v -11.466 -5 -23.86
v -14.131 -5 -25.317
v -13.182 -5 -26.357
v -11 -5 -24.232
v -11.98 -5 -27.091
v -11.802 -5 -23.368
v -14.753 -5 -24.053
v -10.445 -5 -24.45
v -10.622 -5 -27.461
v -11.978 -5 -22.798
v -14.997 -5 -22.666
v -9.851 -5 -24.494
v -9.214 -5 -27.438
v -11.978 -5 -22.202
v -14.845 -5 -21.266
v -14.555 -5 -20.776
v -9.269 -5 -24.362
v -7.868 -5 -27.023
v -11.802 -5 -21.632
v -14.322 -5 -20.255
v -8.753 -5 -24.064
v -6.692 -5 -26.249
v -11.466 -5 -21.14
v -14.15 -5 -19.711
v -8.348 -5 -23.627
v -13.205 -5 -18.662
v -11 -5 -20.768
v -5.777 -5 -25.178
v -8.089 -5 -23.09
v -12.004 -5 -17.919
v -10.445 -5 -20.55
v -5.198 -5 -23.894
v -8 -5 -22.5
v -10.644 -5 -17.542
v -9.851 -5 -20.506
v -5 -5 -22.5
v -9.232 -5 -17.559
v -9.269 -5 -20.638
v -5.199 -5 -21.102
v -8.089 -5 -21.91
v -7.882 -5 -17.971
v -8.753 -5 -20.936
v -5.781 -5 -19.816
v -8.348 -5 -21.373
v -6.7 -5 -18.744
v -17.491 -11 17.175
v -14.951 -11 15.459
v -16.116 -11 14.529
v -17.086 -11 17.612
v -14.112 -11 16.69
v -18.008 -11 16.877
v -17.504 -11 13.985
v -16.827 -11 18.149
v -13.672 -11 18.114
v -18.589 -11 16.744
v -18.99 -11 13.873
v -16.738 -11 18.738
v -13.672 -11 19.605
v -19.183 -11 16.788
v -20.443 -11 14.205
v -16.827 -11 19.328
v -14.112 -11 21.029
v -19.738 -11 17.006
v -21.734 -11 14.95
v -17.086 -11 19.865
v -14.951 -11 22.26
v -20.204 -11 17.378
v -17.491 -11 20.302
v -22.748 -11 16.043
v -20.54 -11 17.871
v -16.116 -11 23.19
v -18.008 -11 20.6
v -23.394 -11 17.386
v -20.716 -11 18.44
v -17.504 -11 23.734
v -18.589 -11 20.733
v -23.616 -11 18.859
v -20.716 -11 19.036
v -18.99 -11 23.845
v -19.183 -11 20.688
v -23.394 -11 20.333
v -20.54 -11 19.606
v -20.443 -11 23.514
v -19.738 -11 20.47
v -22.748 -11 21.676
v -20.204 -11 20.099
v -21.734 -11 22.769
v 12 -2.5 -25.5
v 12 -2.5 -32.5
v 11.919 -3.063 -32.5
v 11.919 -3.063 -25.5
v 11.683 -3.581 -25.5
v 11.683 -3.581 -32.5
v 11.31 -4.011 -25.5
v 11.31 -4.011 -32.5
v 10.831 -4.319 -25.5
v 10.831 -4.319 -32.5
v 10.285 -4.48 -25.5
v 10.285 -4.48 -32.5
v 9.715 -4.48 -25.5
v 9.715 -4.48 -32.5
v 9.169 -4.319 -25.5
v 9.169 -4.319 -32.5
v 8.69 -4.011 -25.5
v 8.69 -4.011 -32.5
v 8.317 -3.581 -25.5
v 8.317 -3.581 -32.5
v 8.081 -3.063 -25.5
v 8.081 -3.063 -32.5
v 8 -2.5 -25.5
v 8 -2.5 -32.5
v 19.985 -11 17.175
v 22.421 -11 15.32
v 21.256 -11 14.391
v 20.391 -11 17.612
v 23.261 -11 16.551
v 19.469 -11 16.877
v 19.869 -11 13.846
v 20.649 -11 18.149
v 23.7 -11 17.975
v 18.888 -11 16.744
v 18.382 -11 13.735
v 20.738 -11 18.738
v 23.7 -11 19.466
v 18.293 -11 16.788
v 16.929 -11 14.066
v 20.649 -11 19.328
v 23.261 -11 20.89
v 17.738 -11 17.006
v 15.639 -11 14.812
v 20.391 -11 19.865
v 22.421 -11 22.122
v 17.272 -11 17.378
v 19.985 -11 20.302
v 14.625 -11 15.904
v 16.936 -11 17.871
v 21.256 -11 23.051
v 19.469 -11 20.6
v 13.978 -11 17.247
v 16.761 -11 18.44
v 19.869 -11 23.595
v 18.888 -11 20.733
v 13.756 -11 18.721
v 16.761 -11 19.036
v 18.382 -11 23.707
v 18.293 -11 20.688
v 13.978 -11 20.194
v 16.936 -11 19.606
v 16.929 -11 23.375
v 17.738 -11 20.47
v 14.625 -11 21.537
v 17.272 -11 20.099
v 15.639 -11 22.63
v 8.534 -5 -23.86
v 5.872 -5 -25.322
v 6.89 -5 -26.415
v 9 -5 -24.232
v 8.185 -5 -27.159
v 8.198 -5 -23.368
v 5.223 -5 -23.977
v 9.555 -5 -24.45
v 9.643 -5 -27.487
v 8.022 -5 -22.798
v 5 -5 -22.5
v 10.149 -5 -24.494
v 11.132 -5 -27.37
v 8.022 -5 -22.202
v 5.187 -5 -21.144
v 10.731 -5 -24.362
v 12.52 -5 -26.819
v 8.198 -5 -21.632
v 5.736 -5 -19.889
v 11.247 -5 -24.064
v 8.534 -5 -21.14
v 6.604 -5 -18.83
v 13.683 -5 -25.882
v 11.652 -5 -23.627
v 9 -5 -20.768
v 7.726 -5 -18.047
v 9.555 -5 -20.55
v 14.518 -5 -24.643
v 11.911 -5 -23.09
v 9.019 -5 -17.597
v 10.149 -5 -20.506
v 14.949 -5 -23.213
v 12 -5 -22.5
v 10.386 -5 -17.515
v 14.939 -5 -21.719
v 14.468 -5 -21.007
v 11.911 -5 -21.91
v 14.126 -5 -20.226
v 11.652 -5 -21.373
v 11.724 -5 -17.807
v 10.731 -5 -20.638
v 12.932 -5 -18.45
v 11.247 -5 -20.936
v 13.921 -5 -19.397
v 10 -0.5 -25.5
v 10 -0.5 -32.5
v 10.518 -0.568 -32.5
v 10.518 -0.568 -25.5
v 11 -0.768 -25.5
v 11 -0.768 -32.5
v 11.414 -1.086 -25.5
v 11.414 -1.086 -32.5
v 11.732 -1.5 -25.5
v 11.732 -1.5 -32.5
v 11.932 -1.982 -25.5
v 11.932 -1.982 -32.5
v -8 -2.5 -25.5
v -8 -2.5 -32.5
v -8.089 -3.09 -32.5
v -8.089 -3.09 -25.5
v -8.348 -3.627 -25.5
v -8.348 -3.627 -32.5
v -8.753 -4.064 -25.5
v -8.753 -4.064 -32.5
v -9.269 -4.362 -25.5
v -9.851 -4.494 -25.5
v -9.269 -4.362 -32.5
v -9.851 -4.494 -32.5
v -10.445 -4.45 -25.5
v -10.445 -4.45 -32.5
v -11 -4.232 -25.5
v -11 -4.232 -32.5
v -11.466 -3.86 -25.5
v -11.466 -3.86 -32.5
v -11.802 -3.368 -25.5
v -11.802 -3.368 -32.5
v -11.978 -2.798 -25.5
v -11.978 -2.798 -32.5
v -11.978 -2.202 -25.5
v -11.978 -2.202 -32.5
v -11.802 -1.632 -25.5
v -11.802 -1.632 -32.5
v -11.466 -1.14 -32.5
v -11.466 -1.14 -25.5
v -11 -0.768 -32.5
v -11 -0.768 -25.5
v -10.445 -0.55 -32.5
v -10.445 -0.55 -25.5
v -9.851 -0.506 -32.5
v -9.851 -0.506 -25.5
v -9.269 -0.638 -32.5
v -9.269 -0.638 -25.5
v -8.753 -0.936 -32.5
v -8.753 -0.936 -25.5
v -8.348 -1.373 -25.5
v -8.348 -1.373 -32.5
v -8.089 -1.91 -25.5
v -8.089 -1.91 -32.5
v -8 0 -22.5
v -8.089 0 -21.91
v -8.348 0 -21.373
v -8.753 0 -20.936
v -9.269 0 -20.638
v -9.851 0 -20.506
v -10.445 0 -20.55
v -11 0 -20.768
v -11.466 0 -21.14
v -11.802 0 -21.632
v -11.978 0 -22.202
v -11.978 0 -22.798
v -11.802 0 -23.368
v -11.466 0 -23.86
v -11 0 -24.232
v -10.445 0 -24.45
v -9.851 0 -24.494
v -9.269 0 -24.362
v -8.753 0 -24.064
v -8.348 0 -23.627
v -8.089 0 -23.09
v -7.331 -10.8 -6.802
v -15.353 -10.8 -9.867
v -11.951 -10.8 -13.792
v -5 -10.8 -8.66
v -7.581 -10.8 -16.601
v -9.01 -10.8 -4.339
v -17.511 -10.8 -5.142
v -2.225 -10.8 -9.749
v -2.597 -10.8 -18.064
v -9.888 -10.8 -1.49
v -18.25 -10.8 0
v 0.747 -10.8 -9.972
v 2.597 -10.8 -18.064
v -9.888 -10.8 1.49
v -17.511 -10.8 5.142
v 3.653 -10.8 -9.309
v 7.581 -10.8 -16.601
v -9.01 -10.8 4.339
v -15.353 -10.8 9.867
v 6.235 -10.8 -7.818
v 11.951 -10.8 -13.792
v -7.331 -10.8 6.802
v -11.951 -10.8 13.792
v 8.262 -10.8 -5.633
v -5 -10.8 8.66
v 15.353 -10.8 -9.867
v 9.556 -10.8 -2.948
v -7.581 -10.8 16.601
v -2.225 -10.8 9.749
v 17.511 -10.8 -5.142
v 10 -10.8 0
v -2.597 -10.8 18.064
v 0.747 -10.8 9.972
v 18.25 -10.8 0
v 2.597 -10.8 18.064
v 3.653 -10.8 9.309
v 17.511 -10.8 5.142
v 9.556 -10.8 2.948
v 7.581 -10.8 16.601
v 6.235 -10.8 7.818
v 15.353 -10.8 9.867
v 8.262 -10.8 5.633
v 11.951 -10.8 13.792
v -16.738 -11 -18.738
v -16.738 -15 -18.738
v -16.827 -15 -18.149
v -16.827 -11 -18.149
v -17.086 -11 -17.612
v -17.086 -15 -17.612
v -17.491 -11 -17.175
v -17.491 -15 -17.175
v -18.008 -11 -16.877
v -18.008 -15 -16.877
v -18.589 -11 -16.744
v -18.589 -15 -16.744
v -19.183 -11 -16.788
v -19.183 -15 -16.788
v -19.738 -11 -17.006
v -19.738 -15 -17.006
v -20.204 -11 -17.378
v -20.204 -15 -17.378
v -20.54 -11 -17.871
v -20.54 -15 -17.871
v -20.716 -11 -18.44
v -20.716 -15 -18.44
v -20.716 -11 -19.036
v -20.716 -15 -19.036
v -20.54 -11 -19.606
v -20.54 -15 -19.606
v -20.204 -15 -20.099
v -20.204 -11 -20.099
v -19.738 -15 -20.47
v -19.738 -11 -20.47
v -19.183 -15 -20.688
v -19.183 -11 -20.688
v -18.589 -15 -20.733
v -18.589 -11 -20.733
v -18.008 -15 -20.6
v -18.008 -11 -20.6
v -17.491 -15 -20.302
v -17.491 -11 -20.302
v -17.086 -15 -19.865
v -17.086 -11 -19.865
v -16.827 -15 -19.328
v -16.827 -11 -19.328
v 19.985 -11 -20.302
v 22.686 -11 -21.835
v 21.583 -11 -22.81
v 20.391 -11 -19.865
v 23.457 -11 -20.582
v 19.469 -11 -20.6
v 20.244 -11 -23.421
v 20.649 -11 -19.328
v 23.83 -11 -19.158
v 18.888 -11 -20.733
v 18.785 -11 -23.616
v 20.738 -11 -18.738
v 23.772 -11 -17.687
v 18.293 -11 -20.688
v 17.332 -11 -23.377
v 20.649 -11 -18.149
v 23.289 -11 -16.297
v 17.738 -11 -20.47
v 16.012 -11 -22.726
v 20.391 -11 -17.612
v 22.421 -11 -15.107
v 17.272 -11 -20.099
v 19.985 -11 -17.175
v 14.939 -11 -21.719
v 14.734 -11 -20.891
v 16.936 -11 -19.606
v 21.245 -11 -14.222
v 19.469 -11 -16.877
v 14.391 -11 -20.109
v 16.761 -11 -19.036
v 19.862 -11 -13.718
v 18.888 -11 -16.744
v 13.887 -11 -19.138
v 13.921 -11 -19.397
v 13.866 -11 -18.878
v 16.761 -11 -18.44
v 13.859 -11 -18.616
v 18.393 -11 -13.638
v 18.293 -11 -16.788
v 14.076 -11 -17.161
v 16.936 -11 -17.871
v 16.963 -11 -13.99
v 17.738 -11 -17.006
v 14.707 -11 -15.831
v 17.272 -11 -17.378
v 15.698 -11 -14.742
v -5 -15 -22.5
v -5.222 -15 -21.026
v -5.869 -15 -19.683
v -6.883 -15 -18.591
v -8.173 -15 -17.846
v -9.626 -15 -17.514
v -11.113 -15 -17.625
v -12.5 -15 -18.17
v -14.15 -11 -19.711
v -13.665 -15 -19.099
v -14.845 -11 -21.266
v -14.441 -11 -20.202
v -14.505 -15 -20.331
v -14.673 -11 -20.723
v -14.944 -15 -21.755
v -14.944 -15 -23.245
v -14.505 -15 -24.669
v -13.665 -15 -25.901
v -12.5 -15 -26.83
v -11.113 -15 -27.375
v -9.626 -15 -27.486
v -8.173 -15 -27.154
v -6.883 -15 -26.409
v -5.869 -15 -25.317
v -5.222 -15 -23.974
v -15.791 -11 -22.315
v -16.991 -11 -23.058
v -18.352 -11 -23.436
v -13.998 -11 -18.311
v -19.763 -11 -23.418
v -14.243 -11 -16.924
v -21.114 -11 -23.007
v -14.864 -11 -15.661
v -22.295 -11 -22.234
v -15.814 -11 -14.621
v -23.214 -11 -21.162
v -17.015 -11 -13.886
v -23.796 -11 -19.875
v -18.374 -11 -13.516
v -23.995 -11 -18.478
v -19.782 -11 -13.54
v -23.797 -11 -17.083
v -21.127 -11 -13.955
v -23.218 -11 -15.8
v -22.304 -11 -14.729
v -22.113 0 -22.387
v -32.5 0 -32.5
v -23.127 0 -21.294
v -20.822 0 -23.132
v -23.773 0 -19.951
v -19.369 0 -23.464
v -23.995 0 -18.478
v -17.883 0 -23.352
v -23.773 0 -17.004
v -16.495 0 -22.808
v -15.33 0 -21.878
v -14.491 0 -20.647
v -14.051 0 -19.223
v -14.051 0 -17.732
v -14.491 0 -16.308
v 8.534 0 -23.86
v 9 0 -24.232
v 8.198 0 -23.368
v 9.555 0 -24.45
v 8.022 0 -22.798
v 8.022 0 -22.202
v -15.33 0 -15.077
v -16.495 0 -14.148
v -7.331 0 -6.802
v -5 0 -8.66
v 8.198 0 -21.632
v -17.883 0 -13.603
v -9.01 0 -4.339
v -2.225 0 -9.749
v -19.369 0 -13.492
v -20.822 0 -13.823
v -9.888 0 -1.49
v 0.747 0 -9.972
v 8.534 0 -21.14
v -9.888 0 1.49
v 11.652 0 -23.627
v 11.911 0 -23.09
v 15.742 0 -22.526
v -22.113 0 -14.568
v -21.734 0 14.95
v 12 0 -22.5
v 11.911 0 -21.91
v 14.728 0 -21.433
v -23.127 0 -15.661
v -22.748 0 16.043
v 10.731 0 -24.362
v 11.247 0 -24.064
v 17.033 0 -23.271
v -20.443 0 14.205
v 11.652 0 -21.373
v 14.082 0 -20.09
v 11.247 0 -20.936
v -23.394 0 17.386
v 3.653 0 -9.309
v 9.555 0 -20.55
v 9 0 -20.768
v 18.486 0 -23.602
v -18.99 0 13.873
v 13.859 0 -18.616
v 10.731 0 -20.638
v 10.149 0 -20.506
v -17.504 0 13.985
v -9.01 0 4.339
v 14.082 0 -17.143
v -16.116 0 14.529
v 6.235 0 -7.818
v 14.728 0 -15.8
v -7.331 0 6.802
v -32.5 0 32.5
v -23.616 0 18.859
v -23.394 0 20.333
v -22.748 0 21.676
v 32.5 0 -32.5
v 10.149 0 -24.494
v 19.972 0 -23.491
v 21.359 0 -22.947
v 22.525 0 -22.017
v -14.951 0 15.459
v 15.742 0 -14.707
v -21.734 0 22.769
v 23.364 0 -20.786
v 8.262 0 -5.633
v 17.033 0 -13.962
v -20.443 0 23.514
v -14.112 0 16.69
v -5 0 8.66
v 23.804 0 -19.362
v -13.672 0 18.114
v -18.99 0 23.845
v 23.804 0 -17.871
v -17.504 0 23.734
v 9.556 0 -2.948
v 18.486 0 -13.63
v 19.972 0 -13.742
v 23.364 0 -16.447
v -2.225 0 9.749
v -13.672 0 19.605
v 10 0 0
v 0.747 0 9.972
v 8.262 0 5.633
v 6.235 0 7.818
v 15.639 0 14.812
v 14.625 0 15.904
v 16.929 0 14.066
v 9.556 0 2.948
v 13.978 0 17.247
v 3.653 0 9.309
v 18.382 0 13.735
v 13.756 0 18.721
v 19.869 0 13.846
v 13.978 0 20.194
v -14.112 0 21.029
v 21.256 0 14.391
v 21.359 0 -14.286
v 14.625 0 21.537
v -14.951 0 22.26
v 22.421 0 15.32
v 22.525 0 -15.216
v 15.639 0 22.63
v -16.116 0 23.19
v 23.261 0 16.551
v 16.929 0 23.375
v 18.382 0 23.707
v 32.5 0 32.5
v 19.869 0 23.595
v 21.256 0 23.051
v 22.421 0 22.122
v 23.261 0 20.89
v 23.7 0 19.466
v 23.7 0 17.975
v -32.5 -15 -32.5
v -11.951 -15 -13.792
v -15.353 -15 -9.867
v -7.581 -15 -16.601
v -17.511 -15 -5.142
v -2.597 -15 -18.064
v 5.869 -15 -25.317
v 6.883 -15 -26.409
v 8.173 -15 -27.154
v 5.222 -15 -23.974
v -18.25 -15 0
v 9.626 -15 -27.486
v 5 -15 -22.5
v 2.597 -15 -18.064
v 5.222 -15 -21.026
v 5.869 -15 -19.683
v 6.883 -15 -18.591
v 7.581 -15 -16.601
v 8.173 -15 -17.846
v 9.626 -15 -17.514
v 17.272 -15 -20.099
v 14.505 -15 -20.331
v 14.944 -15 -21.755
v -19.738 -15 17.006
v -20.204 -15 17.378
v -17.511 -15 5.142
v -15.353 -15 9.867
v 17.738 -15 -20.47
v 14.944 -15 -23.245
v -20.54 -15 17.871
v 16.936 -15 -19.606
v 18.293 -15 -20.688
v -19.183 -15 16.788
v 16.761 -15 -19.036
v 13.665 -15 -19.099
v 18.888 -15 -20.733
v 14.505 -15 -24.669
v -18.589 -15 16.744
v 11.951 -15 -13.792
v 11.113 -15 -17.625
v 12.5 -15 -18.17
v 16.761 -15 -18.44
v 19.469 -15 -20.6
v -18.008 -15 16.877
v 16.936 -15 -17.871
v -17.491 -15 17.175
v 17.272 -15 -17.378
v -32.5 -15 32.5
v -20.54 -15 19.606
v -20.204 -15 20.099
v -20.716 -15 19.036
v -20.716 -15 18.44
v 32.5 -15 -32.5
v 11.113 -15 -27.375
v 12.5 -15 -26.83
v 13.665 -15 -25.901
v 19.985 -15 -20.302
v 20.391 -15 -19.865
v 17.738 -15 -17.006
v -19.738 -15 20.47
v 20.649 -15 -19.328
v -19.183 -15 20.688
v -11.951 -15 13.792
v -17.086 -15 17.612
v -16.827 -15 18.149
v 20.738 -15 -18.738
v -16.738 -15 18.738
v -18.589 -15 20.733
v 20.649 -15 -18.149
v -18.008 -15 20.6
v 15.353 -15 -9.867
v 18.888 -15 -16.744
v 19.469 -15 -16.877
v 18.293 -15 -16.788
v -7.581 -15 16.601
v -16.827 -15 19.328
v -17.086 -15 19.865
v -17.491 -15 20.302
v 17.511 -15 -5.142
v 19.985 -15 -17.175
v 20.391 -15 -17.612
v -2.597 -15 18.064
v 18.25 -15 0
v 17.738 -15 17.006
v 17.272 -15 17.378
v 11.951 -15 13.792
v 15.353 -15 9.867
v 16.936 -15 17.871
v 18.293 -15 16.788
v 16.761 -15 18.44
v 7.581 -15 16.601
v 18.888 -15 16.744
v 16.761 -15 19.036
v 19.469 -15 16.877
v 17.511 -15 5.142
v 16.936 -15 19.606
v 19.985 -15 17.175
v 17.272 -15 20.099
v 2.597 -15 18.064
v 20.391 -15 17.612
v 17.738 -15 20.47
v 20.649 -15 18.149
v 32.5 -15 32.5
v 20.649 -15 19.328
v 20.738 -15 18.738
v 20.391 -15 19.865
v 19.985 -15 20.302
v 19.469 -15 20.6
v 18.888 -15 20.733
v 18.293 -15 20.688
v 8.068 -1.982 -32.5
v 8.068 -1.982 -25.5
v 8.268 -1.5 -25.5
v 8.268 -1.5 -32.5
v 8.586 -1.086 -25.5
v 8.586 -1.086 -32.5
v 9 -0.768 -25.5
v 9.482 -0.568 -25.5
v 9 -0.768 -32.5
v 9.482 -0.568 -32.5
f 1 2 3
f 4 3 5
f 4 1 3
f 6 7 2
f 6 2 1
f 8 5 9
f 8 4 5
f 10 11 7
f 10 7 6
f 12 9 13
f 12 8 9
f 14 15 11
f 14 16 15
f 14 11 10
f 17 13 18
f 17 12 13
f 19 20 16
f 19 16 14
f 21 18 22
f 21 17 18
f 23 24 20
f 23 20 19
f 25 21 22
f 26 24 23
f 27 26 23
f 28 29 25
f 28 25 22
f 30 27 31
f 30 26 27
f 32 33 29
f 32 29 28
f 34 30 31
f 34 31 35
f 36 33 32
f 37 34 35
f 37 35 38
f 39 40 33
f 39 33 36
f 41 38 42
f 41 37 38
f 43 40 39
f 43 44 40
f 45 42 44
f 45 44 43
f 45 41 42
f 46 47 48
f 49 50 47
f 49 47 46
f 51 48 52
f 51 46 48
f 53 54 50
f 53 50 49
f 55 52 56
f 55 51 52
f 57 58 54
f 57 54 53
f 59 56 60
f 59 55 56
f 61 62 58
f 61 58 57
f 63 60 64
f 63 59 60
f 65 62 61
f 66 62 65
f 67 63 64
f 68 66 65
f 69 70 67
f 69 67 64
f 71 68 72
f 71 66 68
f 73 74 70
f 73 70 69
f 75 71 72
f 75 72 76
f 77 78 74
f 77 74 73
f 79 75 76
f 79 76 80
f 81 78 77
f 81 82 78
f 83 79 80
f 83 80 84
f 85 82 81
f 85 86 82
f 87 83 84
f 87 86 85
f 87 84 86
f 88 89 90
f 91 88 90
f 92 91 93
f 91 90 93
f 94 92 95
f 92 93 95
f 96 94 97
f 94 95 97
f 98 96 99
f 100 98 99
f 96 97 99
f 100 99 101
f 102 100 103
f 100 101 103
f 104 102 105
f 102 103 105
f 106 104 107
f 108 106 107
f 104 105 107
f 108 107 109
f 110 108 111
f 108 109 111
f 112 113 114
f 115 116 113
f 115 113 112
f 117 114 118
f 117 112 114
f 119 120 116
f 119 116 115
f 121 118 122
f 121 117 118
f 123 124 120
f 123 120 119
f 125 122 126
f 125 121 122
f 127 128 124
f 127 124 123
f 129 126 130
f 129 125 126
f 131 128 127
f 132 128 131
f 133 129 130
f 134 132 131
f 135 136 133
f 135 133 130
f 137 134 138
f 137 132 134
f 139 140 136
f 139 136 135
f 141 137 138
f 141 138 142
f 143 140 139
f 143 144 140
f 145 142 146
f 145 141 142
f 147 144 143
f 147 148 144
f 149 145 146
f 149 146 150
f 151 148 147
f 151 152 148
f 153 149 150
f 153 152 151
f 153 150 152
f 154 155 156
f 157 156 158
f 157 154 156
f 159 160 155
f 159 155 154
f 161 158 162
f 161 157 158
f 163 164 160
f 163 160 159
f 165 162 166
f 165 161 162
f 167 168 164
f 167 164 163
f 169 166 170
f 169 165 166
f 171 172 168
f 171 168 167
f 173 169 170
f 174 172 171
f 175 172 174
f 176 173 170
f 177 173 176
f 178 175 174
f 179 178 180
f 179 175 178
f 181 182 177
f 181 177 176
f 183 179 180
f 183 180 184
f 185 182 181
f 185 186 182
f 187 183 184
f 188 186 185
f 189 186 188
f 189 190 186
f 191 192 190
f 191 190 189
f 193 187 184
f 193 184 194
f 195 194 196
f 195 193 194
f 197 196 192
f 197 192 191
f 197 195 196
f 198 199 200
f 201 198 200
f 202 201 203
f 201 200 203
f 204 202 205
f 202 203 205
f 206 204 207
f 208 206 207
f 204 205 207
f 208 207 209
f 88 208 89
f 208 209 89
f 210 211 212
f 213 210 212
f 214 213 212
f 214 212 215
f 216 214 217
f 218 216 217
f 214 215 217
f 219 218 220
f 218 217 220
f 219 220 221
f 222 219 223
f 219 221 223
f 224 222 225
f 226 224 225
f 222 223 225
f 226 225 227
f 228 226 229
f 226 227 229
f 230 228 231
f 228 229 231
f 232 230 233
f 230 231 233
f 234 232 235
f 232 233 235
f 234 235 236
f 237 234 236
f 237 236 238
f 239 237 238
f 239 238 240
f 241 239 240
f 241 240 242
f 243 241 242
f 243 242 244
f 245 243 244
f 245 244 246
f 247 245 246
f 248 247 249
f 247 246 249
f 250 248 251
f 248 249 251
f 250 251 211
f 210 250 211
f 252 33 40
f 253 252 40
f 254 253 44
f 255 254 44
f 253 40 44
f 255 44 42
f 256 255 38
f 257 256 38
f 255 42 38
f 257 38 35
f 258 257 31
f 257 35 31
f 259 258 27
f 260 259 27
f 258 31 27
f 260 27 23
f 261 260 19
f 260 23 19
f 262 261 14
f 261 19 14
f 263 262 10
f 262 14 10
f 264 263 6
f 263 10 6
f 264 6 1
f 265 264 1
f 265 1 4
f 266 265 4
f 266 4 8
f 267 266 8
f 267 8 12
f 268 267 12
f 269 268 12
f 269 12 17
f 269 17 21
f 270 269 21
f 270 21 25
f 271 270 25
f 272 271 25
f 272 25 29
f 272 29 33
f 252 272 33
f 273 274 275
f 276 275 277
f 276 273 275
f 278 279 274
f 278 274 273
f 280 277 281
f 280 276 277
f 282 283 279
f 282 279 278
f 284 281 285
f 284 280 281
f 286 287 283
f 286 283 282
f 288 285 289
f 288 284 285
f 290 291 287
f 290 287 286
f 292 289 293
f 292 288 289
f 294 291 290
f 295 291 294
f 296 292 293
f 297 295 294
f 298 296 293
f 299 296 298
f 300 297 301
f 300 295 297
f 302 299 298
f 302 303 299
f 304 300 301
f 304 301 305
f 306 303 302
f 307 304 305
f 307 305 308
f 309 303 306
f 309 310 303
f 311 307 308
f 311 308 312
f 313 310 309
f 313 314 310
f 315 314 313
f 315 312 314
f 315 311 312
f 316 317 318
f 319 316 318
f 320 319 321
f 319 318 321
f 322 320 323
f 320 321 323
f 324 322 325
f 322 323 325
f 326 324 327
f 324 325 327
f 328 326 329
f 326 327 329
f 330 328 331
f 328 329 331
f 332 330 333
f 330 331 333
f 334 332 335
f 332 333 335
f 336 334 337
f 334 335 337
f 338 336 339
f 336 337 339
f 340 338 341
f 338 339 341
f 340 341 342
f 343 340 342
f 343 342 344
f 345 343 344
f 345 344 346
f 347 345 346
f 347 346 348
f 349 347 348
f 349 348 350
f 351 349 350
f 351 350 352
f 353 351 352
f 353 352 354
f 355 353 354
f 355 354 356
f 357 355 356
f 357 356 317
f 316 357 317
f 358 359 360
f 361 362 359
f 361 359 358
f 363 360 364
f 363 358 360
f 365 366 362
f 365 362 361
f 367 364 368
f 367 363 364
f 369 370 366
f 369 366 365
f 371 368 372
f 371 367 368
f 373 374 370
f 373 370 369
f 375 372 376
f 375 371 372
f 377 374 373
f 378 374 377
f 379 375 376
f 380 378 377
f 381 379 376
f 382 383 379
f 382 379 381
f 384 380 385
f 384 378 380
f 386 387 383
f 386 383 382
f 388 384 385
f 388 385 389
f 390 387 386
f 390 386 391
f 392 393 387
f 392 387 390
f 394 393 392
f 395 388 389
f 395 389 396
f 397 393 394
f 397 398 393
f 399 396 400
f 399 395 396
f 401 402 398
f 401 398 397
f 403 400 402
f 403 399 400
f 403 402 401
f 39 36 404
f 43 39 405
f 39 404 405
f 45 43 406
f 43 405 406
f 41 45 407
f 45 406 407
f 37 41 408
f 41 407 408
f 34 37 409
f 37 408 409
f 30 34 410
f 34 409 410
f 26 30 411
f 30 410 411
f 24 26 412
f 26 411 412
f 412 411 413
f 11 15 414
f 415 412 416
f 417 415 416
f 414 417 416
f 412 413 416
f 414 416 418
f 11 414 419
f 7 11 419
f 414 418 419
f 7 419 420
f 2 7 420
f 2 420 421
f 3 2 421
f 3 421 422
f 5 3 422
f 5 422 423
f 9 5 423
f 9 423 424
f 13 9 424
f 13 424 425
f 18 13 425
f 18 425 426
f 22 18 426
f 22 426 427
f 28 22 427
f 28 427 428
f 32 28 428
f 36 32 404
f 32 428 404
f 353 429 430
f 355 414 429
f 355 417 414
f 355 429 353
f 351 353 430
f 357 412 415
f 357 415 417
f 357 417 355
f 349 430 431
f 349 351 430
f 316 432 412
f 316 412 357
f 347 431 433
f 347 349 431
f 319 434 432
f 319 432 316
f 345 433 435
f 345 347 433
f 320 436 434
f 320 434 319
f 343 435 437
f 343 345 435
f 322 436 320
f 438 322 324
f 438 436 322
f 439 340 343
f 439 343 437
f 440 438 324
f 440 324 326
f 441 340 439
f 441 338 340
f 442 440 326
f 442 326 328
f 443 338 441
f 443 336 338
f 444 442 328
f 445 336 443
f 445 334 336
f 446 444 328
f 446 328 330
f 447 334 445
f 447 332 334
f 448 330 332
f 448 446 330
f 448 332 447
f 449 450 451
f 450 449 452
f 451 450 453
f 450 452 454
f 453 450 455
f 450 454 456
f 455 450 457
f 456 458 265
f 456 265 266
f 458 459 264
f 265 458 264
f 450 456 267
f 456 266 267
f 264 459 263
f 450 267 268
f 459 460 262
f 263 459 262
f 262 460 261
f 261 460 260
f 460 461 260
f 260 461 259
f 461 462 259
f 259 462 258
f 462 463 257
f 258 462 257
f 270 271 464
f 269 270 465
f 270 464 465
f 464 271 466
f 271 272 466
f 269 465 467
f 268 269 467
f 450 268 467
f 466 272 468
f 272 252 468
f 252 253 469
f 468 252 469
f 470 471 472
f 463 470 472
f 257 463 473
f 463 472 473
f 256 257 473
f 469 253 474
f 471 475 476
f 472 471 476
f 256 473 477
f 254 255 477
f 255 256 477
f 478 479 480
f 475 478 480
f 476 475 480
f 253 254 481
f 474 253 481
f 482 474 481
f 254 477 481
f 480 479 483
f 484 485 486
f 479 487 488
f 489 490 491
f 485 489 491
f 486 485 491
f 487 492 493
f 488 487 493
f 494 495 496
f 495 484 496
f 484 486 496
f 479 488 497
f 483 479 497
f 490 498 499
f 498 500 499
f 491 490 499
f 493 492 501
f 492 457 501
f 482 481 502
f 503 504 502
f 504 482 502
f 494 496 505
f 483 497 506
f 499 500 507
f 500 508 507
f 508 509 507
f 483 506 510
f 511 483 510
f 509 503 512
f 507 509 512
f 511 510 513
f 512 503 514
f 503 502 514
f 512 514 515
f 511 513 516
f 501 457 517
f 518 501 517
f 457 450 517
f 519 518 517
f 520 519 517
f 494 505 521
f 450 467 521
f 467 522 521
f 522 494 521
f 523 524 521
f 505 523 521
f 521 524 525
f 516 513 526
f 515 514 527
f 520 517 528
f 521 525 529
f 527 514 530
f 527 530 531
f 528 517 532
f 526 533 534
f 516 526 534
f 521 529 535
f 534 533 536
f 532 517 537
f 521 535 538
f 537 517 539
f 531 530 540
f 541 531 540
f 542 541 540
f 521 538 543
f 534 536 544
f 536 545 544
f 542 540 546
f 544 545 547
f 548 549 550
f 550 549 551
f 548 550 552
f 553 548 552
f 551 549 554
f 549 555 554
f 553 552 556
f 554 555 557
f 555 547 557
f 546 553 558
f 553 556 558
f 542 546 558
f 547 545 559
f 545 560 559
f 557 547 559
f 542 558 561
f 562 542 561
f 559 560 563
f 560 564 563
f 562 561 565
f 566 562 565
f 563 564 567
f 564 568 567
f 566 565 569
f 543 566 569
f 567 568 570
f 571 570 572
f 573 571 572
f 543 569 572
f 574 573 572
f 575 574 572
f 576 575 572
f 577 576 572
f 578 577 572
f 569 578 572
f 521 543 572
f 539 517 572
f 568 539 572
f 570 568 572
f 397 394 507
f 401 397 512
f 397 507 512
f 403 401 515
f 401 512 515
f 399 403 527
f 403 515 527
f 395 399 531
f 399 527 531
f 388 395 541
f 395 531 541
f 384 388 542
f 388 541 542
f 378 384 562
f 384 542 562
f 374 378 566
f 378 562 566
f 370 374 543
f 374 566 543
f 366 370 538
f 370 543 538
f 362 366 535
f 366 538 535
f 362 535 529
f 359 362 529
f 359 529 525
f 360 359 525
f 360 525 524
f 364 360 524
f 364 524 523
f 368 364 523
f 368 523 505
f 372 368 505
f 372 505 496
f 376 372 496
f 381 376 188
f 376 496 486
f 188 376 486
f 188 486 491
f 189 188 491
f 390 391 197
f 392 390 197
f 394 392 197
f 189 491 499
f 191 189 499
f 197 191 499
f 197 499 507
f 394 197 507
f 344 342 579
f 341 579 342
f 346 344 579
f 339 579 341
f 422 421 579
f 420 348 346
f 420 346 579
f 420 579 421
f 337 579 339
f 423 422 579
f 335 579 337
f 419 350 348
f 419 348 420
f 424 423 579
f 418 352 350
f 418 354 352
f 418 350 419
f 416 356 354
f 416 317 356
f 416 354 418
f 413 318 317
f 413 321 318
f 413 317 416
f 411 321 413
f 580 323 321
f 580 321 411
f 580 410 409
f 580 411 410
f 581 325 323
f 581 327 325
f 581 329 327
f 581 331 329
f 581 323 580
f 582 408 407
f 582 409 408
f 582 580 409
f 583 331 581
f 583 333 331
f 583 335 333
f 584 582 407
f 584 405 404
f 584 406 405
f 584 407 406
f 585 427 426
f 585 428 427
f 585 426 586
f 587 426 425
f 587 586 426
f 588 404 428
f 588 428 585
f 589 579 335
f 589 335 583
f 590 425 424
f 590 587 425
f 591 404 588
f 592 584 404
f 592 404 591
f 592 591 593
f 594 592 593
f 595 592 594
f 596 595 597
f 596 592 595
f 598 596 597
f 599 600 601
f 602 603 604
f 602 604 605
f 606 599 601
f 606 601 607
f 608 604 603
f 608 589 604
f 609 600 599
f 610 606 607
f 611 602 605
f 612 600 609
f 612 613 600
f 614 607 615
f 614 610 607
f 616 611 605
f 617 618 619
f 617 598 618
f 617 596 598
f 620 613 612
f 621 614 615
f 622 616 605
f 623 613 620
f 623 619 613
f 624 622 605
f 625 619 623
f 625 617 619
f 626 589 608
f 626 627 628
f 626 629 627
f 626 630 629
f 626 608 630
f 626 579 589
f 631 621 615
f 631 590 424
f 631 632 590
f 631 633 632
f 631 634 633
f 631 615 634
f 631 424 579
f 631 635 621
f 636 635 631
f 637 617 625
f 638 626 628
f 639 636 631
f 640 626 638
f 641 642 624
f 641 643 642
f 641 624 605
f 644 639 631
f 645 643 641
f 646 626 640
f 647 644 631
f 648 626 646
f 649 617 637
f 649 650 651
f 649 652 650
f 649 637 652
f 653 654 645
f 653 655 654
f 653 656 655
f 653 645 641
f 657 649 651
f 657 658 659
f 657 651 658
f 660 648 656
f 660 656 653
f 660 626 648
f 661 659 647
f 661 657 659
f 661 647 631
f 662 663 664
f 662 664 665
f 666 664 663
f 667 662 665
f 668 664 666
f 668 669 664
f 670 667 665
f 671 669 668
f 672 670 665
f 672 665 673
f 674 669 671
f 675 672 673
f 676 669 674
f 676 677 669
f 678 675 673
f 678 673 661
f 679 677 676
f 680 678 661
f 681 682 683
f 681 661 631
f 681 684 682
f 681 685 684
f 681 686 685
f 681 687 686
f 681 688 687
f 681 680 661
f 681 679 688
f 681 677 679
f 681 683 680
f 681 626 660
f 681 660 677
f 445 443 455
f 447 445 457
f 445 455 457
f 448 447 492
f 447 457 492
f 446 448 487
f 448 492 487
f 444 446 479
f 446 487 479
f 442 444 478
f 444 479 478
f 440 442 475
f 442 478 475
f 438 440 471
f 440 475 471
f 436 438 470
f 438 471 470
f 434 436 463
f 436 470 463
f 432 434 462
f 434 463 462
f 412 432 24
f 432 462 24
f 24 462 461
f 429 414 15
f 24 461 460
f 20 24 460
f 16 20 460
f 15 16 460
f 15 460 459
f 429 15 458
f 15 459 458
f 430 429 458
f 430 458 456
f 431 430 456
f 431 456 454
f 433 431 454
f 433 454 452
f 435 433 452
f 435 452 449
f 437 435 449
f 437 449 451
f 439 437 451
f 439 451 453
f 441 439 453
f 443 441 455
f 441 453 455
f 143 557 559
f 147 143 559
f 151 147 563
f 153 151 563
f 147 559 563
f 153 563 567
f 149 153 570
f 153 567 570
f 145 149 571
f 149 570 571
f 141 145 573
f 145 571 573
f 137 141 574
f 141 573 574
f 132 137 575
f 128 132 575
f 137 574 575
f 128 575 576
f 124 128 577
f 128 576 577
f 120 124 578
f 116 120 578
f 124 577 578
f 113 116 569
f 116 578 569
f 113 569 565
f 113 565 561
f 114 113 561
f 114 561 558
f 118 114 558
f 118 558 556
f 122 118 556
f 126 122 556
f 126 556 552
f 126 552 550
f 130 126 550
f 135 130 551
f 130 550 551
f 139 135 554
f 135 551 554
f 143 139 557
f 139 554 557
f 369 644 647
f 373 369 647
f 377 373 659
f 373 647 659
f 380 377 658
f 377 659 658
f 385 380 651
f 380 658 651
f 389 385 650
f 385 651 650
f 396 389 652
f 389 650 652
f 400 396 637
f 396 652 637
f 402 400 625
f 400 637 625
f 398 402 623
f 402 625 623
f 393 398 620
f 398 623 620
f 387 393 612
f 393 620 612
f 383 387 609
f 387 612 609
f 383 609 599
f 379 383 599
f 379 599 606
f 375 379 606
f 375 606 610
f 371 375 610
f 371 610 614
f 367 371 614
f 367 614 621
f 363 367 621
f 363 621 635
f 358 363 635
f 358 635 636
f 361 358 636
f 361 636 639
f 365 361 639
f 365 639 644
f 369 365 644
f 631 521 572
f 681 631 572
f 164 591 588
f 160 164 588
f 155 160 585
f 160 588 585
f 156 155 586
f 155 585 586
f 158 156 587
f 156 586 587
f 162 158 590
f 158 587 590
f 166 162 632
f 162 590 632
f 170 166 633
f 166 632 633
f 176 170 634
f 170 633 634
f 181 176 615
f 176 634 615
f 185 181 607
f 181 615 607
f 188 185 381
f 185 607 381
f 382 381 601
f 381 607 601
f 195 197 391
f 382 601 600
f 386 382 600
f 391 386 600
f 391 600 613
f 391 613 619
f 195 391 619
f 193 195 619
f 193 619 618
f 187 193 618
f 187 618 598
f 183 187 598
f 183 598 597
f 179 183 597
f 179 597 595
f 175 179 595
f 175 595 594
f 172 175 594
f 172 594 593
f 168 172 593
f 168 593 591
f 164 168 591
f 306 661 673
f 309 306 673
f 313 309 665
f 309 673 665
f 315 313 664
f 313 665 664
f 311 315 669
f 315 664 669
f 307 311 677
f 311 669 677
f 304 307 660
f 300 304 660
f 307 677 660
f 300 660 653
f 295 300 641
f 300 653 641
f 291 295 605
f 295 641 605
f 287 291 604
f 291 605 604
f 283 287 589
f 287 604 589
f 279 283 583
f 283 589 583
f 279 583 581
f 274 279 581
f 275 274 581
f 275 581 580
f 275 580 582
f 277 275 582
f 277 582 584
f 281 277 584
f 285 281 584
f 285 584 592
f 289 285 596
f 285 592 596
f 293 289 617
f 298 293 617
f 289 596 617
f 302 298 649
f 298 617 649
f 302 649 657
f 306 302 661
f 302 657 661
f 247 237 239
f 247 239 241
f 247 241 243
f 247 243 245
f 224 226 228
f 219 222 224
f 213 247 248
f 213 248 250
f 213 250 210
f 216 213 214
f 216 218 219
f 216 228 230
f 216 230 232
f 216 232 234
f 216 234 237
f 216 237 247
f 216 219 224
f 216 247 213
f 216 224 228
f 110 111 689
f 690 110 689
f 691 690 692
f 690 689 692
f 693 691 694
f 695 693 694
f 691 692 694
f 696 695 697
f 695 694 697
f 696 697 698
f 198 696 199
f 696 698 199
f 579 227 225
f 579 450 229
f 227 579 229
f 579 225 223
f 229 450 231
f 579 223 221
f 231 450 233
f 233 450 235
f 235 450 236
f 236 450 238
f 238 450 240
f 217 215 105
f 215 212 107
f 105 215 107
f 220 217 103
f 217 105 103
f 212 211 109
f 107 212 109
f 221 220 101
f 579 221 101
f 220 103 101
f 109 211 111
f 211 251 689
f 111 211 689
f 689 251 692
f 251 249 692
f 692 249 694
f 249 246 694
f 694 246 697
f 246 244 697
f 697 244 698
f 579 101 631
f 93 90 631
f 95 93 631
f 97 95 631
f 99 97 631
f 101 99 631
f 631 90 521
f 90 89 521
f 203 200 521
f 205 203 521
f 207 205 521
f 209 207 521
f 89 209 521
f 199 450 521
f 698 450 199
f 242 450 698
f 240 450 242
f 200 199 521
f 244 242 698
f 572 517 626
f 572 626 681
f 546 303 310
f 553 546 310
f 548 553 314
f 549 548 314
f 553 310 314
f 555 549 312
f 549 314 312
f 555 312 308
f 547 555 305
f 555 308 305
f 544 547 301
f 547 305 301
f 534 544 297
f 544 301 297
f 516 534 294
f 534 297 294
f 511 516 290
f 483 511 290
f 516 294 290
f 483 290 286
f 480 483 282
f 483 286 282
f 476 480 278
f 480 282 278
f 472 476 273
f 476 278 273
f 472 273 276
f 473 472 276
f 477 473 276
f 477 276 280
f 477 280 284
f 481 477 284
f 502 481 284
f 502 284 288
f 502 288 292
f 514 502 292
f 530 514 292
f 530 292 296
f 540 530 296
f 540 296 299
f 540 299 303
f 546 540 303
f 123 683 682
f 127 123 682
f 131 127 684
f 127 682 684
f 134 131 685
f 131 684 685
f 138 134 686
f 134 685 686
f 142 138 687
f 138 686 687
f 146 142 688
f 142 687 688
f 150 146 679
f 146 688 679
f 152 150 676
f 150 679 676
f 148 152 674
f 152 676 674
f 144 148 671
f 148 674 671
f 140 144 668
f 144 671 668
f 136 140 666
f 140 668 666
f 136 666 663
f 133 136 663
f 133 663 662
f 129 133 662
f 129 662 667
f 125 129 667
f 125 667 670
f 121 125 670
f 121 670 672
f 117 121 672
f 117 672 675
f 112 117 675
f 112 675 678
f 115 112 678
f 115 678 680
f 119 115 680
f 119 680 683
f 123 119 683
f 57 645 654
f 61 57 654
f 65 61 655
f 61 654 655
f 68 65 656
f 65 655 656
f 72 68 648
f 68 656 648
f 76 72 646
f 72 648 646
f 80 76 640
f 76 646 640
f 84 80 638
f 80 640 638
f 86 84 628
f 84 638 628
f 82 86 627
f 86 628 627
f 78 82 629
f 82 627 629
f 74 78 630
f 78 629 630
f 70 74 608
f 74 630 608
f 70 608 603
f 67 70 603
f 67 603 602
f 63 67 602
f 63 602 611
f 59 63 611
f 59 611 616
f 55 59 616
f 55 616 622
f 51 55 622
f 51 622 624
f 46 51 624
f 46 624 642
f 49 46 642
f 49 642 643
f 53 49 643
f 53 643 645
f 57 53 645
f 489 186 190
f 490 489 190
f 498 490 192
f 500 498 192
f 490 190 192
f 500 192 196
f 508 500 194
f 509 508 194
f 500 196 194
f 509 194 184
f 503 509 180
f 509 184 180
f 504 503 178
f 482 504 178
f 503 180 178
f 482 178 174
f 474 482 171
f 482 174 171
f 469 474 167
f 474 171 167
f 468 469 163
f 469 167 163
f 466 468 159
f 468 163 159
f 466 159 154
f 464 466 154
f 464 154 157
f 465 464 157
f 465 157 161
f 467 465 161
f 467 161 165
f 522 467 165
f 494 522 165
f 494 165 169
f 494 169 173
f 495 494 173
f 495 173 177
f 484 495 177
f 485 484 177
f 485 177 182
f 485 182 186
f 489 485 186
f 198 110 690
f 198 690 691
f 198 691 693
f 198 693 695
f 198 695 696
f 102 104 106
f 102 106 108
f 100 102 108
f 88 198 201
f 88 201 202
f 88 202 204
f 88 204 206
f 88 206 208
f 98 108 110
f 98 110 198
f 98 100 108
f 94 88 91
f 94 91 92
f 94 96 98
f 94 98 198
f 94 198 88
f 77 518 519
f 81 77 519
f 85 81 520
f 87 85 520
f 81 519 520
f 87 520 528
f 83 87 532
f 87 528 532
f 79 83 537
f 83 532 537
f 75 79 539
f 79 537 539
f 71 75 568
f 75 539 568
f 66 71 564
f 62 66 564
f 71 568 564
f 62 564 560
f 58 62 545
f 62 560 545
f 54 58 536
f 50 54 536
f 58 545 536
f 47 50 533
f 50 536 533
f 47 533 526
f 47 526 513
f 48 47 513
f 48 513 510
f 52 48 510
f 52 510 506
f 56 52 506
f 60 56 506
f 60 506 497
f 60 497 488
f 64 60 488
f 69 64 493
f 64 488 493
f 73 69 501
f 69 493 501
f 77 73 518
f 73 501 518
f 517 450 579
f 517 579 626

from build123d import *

# Parameters (mm, degrees)
F0_W      = 65
F0_H      = 65
F1_DEPTH  = 15
F2_R      = 18.25
F3_DEPTH  = 4.2
F4_R      = 10
F5_DEPTH  = 25
F6_R      = 5
F7_DEPTH  = 10
F8_R      = 2
F9_DEPTH  = 25
F12_R     = 5
F13_DEPTH = 11
F11_R     = 2
F14_DEPTH = 25
F15_R     = 2
F16_DEPTH = 7


with BuildPart() as f1:
    # F0 (on Front) → F1 (new body)
    with BuildSketch(Plane.XZ):
        Rectangle(F0_W, F0_H)
    extrude(amount=F1_DEPTH)

    # F2 (on face) → F3 (cut)
    with BuildSketch(Plane.XZ.offset(15)):
        Circle(F2_R)
    extrude(amount=-F3_DEPTH, mode=Mode.SUBTRACT)

    # F4 (on face) → F5 (cut)
    with BuildSketch(Plane.XZ.offset(15)):
        Circle(F4_R)
    extrude(amount=-F5_DEPTH, mode=Mode.SUBTRACT)

    # F6 (on face) → F7 (cut)
    with BuildSketch(Plane.XZ.offset(15)):
        with BuildLine():
            ThreePointArc((15, -22.5), (10, -17.5), (5, -22.5))
            ThreePointArc((5, -22.5), (10, -27.5), (15, -22.5))
        make_face()
        with Locations((-10, -22.5)):
            Circle(F6_R)
    extrude(amount=-F7_DEPTH, mode=Mode.SUBTRACT)

    # F8 (on face) → F9 (cut)
    with BuildSketch(Plane.XZ.offset(15)):
        with Locations((-10, -22.5)):
            Circle(F8_R)
        with Locations((10, -22.5)):
            Circle(F8_R)
    extrude(amount=-F9_DEPTH, mode=Mode.SUBTRACT)

    # F12 (on face) → F13 (cut)
    with BuildSketch(Plane(origin=(0, 0, 0), x_dir=(-1, 0, 0), z_dir=(0, 1, 0))):
        with Locations((18.616408, 18.859463)):
            Circle(F12_R)
        with Locations((18.995447, -18.477634)):
            Circle(F12_R)
        with Locations((-18.859462, -18.616409)):
            Circle(F12_R)
        with Locations((-18.75598, 18.720663)):
            Circle(F12_R)
    extrude(amount=-F13_DEPTH, mode=Mode.SUBTRACT)

    # F11 (on face) → F14 (cut)
    with BuildSketch(Plane.XZ.offset(15)):
        with Locations((-18.73833, 18.73833)):
            Circle(F11_R)
        with Locations((-18.73833, -18.73833)):
            Circle(F11_R)
        with Locations((18.73833, 18.73833)):
            Circle(F11_R)
        with Locations((18.73833, -18.73833)):
            Circle(F11_R)
    extrude(amount=-F14_DEPTH, mode=Mode.SUBTRACT)

    # F15 (on face) → F16 (cut)
    with BuildSketch(Plane(origin=(0, 0, -32.5), x_dir=(1, 0, 0), z_dir=(0, 0, -1))):
        with BuildLine():
            ThreePointArc((8, 2.5), (8.585786, 1.085786), (10, 0.5))
            Line((10, 0.5), (10, 2.5))
            Line((10, 2.5), (8, 2.5))
        make_face()
        with Locations((-10, 2.5)):
            Circle(F15_R)
        with BuildLine():
            Line((10, 2.5), (10, 0.5))
            ThreePointArc((10, 0.5), (11.414214, 1.085786), (12, 2.5))
            ThreePointArc((12, 2.5), (10, 4.5), (8, 2.5))
            Line((8, 2.5), (10, 2.5))
        make_face()
    extrude(amount=-F16_DEPTH, mode=Mode.SUBTRACT)


solid = f1.part
